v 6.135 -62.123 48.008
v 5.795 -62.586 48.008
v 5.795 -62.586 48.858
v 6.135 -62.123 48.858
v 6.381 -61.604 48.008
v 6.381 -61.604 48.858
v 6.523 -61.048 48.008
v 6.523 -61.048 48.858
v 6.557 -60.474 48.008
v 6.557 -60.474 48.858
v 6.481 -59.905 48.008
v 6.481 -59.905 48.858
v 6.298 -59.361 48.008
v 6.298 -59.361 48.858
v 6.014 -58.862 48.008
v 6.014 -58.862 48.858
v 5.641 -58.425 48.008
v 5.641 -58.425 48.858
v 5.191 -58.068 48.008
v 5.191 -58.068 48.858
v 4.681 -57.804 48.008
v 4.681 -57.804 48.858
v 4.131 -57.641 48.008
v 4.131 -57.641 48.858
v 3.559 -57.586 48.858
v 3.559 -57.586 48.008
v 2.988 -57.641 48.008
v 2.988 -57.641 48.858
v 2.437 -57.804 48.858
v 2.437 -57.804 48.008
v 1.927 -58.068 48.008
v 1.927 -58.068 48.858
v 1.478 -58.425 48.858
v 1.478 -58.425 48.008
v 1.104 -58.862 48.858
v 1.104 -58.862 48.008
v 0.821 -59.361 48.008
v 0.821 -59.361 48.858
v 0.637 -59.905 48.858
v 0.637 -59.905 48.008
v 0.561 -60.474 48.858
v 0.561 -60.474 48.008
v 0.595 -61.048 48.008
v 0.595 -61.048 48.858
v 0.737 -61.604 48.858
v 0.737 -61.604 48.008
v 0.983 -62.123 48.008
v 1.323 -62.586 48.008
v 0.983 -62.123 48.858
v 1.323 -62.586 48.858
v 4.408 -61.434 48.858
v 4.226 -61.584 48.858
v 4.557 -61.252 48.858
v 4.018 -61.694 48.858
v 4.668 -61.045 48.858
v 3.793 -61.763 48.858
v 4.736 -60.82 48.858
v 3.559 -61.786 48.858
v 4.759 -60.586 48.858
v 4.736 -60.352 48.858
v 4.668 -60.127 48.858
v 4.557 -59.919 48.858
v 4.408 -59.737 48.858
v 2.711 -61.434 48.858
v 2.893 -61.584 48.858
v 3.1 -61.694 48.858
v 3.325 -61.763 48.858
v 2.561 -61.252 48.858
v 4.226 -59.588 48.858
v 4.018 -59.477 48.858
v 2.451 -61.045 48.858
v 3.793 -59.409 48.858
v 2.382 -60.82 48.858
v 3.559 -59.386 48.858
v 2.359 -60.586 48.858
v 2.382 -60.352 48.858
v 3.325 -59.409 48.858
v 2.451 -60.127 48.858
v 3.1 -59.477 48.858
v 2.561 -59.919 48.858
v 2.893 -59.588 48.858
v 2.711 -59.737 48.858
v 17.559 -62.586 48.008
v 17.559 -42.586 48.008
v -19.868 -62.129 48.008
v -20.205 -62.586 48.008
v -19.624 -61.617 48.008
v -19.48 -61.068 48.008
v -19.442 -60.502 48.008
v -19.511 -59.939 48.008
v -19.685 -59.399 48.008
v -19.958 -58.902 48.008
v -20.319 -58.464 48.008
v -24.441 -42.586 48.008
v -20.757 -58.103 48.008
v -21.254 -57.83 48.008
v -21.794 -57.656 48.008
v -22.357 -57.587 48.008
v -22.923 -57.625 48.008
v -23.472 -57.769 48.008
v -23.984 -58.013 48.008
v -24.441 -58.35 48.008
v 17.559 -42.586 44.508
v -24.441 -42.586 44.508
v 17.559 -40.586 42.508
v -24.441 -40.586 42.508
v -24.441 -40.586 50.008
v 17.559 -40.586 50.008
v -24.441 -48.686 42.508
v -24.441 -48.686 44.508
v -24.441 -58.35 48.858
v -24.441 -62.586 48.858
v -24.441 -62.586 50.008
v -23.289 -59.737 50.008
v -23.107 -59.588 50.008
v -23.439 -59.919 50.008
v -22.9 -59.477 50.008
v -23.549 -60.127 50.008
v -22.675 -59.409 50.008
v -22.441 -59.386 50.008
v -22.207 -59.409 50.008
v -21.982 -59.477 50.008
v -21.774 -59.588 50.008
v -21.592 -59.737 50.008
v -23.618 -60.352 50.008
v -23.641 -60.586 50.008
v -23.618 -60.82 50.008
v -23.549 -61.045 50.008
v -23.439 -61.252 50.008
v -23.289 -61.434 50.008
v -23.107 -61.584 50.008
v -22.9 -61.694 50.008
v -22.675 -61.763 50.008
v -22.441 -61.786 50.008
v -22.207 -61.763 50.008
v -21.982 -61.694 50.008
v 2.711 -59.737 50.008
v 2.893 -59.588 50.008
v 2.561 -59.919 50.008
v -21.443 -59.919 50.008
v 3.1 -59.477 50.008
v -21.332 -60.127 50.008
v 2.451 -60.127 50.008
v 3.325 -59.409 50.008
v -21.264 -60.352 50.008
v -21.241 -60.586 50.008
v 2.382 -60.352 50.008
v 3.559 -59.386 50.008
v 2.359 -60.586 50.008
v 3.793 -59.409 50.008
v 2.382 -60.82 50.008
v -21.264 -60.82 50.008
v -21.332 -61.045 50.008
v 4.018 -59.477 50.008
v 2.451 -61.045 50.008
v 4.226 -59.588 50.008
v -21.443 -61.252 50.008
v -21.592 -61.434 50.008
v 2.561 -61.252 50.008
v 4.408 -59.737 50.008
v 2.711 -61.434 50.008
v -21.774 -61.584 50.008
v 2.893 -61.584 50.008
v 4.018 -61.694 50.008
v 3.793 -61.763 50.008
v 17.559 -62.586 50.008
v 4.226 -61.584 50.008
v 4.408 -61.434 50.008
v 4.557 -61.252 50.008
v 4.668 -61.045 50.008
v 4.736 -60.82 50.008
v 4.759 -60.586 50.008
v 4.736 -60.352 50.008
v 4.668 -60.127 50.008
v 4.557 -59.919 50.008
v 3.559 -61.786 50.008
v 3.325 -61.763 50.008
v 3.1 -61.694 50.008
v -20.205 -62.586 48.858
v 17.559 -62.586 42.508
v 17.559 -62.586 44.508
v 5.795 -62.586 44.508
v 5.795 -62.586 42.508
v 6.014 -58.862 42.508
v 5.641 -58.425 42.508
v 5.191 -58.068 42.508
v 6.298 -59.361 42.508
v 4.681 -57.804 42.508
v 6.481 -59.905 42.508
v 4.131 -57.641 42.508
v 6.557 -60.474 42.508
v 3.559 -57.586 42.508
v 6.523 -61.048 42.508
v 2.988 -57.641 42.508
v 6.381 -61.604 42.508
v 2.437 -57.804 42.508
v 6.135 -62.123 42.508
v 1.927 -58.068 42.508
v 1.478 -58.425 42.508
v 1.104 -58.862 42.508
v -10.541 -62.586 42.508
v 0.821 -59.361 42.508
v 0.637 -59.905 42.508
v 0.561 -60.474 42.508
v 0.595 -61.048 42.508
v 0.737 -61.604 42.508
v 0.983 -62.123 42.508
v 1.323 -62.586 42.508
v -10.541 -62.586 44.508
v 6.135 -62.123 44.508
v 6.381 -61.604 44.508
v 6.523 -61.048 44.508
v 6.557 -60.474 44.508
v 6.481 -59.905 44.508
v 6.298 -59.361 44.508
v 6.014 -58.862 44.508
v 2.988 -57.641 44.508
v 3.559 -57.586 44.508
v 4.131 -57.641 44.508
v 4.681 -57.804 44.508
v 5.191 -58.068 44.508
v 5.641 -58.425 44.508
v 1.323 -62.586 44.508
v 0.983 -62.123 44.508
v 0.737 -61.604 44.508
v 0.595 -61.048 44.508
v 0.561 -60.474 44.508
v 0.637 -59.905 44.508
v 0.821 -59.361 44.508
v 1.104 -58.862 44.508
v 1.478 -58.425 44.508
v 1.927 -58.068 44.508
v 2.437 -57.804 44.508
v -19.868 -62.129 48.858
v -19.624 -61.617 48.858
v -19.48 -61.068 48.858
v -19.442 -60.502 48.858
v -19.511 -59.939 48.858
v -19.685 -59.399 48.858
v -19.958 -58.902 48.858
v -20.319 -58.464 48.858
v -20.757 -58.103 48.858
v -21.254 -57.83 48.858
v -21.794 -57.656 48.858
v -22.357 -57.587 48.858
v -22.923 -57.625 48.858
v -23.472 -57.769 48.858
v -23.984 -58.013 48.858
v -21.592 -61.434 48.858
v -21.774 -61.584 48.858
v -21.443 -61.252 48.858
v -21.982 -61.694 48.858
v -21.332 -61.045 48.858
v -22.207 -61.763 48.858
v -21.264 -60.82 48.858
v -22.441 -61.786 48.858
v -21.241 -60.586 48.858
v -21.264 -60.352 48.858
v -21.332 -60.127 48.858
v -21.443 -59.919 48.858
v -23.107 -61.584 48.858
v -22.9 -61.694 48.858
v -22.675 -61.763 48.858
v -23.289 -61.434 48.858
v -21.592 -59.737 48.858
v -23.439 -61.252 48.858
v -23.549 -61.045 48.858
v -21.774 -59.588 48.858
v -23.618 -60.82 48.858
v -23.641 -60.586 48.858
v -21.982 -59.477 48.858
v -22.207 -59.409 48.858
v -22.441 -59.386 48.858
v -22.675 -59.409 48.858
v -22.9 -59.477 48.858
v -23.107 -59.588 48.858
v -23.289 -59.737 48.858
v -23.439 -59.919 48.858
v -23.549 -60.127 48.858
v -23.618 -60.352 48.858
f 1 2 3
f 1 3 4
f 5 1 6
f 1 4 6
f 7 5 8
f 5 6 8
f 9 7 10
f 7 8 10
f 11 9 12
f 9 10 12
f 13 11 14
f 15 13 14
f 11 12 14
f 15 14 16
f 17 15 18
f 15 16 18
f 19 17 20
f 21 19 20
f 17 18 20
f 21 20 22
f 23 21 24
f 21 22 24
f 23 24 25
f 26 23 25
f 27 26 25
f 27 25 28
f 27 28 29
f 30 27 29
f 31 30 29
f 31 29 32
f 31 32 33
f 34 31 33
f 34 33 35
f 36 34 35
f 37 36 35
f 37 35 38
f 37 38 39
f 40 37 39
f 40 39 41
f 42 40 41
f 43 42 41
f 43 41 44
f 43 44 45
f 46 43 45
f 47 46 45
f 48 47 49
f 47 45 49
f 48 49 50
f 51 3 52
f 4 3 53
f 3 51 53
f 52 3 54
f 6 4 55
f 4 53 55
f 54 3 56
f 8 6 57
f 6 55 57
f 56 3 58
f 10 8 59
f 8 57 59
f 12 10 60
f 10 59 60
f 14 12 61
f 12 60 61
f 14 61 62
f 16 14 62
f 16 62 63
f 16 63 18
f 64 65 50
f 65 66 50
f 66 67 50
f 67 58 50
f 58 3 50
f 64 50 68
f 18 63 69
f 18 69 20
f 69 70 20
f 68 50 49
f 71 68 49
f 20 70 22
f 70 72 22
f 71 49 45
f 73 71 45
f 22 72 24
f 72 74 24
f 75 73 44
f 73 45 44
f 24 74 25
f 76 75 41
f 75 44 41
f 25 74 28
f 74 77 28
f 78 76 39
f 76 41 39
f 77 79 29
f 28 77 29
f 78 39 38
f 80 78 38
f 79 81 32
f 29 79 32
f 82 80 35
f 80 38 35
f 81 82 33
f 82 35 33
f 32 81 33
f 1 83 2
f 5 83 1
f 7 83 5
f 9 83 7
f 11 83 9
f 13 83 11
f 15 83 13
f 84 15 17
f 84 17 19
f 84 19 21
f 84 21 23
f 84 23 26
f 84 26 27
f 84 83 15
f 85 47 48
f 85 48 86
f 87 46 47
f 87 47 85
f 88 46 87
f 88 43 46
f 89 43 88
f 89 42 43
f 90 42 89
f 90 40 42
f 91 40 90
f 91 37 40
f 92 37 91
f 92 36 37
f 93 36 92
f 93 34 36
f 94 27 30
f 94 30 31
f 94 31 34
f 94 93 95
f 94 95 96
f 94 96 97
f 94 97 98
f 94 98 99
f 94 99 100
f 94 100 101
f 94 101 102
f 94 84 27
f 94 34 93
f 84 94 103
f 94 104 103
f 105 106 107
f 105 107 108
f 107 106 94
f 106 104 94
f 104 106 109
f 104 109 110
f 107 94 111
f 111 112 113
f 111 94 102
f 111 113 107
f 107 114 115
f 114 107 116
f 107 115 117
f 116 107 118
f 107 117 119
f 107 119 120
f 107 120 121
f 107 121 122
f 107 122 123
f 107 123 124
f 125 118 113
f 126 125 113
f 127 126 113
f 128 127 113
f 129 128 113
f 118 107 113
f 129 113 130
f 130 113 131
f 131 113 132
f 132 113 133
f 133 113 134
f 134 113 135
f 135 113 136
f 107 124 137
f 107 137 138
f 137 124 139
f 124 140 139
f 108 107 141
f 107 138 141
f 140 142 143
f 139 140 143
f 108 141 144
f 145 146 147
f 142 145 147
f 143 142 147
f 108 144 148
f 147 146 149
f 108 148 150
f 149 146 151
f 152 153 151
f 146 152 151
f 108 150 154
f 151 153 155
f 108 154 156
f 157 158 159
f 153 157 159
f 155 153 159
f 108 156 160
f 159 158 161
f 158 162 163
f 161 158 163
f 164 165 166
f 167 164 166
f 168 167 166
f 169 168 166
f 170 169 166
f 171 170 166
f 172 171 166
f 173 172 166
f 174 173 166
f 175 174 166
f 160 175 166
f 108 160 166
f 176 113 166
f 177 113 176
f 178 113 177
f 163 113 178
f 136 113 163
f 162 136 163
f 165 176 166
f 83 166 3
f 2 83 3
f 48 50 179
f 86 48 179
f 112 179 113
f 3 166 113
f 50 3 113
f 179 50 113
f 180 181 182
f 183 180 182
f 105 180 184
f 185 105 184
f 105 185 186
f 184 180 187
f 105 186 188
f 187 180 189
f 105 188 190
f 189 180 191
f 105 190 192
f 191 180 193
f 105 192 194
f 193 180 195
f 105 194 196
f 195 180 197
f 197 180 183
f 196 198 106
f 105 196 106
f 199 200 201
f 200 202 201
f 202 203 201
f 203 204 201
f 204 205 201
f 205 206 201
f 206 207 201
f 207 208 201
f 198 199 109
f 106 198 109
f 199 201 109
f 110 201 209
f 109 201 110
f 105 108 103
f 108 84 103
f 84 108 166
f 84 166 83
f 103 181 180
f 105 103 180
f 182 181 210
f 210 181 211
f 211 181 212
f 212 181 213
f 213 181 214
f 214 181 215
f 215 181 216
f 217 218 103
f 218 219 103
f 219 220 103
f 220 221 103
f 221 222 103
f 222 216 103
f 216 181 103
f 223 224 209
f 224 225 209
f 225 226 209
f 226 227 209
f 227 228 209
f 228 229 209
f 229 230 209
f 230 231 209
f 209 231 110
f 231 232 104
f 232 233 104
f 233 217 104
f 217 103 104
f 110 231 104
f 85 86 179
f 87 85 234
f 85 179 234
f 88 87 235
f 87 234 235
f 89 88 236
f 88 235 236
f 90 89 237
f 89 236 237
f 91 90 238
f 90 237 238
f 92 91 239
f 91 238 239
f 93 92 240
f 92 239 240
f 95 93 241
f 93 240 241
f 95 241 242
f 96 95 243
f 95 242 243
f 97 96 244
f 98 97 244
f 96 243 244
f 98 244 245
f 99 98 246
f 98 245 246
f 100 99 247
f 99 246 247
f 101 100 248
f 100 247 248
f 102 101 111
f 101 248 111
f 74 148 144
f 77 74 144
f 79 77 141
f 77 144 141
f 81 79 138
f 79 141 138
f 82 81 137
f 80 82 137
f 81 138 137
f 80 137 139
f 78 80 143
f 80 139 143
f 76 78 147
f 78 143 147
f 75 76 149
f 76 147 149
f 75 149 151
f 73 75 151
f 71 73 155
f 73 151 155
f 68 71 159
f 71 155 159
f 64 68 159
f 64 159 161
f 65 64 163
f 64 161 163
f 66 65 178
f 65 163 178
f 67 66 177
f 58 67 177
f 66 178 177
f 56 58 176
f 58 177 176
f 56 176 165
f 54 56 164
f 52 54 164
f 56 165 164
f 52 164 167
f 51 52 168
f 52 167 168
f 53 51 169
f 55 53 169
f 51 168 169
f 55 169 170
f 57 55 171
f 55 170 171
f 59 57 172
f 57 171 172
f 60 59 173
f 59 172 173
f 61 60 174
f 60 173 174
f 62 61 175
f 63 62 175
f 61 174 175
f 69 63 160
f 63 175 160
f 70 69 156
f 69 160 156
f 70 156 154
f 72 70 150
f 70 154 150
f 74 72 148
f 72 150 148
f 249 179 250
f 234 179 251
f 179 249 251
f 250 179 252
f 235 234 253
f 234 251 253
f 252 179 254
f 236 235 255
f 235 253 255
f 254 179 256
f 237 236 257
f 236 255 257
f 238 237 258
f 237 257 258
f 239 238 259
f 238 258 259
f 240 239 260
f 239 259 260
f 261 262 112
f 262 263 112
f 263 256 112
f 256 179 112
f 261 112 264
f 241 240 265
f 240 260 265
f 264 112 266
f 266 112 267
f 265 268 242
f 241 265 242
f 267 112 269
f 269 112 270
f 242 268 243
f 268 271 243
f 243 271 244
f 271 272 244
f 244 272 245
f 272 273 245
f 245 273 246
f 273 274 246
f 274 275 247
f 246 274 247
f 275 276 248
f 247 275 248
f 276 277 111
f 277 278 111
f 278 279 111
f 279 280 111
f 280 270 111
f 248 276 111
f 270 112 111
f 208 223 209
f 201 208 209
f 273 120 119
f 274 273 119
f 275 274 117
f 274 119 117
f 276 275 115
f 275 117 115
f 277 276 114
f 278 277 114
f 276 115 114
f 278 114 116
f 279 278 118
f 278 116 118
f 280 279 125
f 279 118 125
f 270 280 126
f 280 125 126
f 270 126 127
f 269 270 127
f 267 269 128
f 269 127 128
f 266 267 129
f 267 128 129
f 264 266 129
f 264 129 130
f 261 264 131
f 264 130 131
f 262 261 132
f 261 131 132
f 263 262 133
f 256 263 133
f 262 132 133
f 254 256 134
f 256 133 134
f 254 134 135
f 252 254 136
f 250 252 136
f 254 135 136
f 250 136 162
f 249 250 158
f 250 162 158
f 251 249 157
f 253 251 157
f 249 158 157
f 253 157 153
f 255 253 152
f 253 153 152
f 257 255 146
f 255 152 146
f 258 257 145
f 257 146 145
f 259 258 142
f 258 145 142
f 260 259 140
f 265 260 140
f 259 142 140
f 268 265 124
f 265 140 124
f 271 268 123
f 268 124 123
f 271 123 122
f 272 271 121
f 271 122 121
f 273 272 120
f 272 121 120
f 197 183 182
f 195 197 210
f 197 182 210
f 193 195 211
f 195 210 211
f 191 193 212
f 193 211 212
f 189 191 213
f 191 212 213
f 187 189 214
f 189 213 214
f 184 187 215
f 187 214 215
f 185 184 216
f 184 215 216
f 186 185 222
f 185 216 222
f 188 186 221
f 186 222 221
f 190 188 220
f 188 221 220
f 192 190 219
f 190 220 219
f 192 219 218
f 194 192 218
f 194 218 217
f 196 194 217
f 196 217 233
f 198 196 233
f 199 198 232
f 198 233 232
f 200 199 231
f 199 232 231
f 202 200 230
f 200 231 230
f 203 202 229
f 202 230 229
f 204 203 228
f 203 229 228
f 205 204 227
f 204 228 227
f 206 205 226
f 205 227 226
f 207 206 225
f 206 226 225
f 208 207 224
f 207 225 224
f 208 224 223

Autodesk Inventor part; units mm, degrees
ref_plane "YZ Plane" through (0, 0, 0) normal (1, 0, 0) x (0, 1, 0)
ref_plane "XZ Plane" through (0, 0, 0) normal (0, 1, 0) x (-1, 0, 0)
ref_plane "XY Plane" through (0, 0, 0) normal (0, 0, 1) x (1, 0, 0)
ref_plane "Work Plane1" through (149.76, -42.5858, 44.0081) normal (0, 1, 0) x (-1, 0, 0)
sketch "Sketch1" plane through (149.76, -42.5858, 44.0081) normal (0, 1, 0) x (-1, 0, 0)
  line L0 (106, 4) -> (260, 4) projected
  line L1 (106, 0) -> (260, 0) construction
  line L2 (106, 0.5) -> (260, 0.5)
  line L3 (106, 6) -> (260, 6)
  line L4 (106, -1.5) -> (260, -1.5)
  line L5 (174.2008, 6) -> (174.2008, 4)
  line L6 (132.2008, -1.5) -> (132.2008, 0.5)
  line L7 (174.2008, 4) -> (174.2008, 0.5)
  line L8 (174.2008, 0.5) -> (174.2008, -1.5)
  line L9 (132.2008, 4) -> (132.2008, 6)
  line L10 (132.2008, 0.5) -> (132.2008, 4)
  point P0 (149.76, -44.0081)
  dimension "d0" = 0.5
  dimension "d1" = 2
  dimension "d2" = 2
  dimension "d3" = 42
extrude "Extrusion1" add sketch "Sketch1" against normal blind 20 contours L9 L3 L5 L0 | L2 L8 L4 L6
sketch "Sketch2" plane through (149.76, -42.5858, 44.0081) normal (0, 1, 0) x (1, 0, 0)
  line L0 (-132.2008, 1.5) -> (-174.2008, 1.5) projected
  line L1 (-174.2008, 1.5) -> (-174.2008, -0.5) projected
  line L2 (-174.2008, -4) -> (-174.2008, -0.5) projected
  line L3 (-174.2008, -4) -> (-174.2008, -6) projected
  line L4 (-174.2008, -6) -> (-132.2008, -6) projected
  line L5 (-132.2008, -6) -> (-132.2008, -4) projected
  line L6 (-132.2008, -0.5) -> (-132.2008, -4) projected
  line L7 (-132.2008, -0.5) -> (-132.2008, 1.5) projected
  point P0 (-149.76, 44.0081)
extrude "Extrusion2" add sketch "Sketch2" along normal blind 2
sketch "Sketch3" plane through (17.5592, -62.5858, 42.5081) normal (0, 0, -1) x (-1, 0, 0)
  line L0 (0, 20) -> (0, 0) projected
  line L1 (0, 2) -> (42, 2) construction
  line L2 (42, 20) -> (42, 0) projected
  line L3 (42, 0) -> (0, 0) projected
  line L4 (28.1005, 0) -> (42, 13.8995)
  point P0 (17.5592, 62.5858)
  point P1 (40, 2)
  point P2 (14, 2)
  dimension "d8" = 2
  dimension "d12" = 7
  dimension "d23" = 45
  dimension "d24" = 2
  dimension "d25" = 26
hole "Hole1" at (3.5592, -60.5858, 42.5081) at (-22.4408, -60.5858, 42.5081) direction (0, 0, 1) diameter 2.4 end through all counterbore diameter 6 counterbore depth 6.35 clearance for "Hex Head Bolt / Nut GOST 12876-67" size "M2" standard "GOST"
sketch "Sketch4" plane through (17.5592, -40.5858, 42.5081) normal (0, 0, -1) x (-1, 0, 0)
  line L0 (0, -2) -> (0, -22) projected
  line L1 (42, -22) -> (0, -22) projected
  line L2 (28.1005, -22) -> (42, -8.1005) projected
  point P0 (17.5592, 40.5858)
extrude "Extrusion3" cut sketch "Sketch3" against normal up to surface (2 mm away)
properties part number "display_holder"
